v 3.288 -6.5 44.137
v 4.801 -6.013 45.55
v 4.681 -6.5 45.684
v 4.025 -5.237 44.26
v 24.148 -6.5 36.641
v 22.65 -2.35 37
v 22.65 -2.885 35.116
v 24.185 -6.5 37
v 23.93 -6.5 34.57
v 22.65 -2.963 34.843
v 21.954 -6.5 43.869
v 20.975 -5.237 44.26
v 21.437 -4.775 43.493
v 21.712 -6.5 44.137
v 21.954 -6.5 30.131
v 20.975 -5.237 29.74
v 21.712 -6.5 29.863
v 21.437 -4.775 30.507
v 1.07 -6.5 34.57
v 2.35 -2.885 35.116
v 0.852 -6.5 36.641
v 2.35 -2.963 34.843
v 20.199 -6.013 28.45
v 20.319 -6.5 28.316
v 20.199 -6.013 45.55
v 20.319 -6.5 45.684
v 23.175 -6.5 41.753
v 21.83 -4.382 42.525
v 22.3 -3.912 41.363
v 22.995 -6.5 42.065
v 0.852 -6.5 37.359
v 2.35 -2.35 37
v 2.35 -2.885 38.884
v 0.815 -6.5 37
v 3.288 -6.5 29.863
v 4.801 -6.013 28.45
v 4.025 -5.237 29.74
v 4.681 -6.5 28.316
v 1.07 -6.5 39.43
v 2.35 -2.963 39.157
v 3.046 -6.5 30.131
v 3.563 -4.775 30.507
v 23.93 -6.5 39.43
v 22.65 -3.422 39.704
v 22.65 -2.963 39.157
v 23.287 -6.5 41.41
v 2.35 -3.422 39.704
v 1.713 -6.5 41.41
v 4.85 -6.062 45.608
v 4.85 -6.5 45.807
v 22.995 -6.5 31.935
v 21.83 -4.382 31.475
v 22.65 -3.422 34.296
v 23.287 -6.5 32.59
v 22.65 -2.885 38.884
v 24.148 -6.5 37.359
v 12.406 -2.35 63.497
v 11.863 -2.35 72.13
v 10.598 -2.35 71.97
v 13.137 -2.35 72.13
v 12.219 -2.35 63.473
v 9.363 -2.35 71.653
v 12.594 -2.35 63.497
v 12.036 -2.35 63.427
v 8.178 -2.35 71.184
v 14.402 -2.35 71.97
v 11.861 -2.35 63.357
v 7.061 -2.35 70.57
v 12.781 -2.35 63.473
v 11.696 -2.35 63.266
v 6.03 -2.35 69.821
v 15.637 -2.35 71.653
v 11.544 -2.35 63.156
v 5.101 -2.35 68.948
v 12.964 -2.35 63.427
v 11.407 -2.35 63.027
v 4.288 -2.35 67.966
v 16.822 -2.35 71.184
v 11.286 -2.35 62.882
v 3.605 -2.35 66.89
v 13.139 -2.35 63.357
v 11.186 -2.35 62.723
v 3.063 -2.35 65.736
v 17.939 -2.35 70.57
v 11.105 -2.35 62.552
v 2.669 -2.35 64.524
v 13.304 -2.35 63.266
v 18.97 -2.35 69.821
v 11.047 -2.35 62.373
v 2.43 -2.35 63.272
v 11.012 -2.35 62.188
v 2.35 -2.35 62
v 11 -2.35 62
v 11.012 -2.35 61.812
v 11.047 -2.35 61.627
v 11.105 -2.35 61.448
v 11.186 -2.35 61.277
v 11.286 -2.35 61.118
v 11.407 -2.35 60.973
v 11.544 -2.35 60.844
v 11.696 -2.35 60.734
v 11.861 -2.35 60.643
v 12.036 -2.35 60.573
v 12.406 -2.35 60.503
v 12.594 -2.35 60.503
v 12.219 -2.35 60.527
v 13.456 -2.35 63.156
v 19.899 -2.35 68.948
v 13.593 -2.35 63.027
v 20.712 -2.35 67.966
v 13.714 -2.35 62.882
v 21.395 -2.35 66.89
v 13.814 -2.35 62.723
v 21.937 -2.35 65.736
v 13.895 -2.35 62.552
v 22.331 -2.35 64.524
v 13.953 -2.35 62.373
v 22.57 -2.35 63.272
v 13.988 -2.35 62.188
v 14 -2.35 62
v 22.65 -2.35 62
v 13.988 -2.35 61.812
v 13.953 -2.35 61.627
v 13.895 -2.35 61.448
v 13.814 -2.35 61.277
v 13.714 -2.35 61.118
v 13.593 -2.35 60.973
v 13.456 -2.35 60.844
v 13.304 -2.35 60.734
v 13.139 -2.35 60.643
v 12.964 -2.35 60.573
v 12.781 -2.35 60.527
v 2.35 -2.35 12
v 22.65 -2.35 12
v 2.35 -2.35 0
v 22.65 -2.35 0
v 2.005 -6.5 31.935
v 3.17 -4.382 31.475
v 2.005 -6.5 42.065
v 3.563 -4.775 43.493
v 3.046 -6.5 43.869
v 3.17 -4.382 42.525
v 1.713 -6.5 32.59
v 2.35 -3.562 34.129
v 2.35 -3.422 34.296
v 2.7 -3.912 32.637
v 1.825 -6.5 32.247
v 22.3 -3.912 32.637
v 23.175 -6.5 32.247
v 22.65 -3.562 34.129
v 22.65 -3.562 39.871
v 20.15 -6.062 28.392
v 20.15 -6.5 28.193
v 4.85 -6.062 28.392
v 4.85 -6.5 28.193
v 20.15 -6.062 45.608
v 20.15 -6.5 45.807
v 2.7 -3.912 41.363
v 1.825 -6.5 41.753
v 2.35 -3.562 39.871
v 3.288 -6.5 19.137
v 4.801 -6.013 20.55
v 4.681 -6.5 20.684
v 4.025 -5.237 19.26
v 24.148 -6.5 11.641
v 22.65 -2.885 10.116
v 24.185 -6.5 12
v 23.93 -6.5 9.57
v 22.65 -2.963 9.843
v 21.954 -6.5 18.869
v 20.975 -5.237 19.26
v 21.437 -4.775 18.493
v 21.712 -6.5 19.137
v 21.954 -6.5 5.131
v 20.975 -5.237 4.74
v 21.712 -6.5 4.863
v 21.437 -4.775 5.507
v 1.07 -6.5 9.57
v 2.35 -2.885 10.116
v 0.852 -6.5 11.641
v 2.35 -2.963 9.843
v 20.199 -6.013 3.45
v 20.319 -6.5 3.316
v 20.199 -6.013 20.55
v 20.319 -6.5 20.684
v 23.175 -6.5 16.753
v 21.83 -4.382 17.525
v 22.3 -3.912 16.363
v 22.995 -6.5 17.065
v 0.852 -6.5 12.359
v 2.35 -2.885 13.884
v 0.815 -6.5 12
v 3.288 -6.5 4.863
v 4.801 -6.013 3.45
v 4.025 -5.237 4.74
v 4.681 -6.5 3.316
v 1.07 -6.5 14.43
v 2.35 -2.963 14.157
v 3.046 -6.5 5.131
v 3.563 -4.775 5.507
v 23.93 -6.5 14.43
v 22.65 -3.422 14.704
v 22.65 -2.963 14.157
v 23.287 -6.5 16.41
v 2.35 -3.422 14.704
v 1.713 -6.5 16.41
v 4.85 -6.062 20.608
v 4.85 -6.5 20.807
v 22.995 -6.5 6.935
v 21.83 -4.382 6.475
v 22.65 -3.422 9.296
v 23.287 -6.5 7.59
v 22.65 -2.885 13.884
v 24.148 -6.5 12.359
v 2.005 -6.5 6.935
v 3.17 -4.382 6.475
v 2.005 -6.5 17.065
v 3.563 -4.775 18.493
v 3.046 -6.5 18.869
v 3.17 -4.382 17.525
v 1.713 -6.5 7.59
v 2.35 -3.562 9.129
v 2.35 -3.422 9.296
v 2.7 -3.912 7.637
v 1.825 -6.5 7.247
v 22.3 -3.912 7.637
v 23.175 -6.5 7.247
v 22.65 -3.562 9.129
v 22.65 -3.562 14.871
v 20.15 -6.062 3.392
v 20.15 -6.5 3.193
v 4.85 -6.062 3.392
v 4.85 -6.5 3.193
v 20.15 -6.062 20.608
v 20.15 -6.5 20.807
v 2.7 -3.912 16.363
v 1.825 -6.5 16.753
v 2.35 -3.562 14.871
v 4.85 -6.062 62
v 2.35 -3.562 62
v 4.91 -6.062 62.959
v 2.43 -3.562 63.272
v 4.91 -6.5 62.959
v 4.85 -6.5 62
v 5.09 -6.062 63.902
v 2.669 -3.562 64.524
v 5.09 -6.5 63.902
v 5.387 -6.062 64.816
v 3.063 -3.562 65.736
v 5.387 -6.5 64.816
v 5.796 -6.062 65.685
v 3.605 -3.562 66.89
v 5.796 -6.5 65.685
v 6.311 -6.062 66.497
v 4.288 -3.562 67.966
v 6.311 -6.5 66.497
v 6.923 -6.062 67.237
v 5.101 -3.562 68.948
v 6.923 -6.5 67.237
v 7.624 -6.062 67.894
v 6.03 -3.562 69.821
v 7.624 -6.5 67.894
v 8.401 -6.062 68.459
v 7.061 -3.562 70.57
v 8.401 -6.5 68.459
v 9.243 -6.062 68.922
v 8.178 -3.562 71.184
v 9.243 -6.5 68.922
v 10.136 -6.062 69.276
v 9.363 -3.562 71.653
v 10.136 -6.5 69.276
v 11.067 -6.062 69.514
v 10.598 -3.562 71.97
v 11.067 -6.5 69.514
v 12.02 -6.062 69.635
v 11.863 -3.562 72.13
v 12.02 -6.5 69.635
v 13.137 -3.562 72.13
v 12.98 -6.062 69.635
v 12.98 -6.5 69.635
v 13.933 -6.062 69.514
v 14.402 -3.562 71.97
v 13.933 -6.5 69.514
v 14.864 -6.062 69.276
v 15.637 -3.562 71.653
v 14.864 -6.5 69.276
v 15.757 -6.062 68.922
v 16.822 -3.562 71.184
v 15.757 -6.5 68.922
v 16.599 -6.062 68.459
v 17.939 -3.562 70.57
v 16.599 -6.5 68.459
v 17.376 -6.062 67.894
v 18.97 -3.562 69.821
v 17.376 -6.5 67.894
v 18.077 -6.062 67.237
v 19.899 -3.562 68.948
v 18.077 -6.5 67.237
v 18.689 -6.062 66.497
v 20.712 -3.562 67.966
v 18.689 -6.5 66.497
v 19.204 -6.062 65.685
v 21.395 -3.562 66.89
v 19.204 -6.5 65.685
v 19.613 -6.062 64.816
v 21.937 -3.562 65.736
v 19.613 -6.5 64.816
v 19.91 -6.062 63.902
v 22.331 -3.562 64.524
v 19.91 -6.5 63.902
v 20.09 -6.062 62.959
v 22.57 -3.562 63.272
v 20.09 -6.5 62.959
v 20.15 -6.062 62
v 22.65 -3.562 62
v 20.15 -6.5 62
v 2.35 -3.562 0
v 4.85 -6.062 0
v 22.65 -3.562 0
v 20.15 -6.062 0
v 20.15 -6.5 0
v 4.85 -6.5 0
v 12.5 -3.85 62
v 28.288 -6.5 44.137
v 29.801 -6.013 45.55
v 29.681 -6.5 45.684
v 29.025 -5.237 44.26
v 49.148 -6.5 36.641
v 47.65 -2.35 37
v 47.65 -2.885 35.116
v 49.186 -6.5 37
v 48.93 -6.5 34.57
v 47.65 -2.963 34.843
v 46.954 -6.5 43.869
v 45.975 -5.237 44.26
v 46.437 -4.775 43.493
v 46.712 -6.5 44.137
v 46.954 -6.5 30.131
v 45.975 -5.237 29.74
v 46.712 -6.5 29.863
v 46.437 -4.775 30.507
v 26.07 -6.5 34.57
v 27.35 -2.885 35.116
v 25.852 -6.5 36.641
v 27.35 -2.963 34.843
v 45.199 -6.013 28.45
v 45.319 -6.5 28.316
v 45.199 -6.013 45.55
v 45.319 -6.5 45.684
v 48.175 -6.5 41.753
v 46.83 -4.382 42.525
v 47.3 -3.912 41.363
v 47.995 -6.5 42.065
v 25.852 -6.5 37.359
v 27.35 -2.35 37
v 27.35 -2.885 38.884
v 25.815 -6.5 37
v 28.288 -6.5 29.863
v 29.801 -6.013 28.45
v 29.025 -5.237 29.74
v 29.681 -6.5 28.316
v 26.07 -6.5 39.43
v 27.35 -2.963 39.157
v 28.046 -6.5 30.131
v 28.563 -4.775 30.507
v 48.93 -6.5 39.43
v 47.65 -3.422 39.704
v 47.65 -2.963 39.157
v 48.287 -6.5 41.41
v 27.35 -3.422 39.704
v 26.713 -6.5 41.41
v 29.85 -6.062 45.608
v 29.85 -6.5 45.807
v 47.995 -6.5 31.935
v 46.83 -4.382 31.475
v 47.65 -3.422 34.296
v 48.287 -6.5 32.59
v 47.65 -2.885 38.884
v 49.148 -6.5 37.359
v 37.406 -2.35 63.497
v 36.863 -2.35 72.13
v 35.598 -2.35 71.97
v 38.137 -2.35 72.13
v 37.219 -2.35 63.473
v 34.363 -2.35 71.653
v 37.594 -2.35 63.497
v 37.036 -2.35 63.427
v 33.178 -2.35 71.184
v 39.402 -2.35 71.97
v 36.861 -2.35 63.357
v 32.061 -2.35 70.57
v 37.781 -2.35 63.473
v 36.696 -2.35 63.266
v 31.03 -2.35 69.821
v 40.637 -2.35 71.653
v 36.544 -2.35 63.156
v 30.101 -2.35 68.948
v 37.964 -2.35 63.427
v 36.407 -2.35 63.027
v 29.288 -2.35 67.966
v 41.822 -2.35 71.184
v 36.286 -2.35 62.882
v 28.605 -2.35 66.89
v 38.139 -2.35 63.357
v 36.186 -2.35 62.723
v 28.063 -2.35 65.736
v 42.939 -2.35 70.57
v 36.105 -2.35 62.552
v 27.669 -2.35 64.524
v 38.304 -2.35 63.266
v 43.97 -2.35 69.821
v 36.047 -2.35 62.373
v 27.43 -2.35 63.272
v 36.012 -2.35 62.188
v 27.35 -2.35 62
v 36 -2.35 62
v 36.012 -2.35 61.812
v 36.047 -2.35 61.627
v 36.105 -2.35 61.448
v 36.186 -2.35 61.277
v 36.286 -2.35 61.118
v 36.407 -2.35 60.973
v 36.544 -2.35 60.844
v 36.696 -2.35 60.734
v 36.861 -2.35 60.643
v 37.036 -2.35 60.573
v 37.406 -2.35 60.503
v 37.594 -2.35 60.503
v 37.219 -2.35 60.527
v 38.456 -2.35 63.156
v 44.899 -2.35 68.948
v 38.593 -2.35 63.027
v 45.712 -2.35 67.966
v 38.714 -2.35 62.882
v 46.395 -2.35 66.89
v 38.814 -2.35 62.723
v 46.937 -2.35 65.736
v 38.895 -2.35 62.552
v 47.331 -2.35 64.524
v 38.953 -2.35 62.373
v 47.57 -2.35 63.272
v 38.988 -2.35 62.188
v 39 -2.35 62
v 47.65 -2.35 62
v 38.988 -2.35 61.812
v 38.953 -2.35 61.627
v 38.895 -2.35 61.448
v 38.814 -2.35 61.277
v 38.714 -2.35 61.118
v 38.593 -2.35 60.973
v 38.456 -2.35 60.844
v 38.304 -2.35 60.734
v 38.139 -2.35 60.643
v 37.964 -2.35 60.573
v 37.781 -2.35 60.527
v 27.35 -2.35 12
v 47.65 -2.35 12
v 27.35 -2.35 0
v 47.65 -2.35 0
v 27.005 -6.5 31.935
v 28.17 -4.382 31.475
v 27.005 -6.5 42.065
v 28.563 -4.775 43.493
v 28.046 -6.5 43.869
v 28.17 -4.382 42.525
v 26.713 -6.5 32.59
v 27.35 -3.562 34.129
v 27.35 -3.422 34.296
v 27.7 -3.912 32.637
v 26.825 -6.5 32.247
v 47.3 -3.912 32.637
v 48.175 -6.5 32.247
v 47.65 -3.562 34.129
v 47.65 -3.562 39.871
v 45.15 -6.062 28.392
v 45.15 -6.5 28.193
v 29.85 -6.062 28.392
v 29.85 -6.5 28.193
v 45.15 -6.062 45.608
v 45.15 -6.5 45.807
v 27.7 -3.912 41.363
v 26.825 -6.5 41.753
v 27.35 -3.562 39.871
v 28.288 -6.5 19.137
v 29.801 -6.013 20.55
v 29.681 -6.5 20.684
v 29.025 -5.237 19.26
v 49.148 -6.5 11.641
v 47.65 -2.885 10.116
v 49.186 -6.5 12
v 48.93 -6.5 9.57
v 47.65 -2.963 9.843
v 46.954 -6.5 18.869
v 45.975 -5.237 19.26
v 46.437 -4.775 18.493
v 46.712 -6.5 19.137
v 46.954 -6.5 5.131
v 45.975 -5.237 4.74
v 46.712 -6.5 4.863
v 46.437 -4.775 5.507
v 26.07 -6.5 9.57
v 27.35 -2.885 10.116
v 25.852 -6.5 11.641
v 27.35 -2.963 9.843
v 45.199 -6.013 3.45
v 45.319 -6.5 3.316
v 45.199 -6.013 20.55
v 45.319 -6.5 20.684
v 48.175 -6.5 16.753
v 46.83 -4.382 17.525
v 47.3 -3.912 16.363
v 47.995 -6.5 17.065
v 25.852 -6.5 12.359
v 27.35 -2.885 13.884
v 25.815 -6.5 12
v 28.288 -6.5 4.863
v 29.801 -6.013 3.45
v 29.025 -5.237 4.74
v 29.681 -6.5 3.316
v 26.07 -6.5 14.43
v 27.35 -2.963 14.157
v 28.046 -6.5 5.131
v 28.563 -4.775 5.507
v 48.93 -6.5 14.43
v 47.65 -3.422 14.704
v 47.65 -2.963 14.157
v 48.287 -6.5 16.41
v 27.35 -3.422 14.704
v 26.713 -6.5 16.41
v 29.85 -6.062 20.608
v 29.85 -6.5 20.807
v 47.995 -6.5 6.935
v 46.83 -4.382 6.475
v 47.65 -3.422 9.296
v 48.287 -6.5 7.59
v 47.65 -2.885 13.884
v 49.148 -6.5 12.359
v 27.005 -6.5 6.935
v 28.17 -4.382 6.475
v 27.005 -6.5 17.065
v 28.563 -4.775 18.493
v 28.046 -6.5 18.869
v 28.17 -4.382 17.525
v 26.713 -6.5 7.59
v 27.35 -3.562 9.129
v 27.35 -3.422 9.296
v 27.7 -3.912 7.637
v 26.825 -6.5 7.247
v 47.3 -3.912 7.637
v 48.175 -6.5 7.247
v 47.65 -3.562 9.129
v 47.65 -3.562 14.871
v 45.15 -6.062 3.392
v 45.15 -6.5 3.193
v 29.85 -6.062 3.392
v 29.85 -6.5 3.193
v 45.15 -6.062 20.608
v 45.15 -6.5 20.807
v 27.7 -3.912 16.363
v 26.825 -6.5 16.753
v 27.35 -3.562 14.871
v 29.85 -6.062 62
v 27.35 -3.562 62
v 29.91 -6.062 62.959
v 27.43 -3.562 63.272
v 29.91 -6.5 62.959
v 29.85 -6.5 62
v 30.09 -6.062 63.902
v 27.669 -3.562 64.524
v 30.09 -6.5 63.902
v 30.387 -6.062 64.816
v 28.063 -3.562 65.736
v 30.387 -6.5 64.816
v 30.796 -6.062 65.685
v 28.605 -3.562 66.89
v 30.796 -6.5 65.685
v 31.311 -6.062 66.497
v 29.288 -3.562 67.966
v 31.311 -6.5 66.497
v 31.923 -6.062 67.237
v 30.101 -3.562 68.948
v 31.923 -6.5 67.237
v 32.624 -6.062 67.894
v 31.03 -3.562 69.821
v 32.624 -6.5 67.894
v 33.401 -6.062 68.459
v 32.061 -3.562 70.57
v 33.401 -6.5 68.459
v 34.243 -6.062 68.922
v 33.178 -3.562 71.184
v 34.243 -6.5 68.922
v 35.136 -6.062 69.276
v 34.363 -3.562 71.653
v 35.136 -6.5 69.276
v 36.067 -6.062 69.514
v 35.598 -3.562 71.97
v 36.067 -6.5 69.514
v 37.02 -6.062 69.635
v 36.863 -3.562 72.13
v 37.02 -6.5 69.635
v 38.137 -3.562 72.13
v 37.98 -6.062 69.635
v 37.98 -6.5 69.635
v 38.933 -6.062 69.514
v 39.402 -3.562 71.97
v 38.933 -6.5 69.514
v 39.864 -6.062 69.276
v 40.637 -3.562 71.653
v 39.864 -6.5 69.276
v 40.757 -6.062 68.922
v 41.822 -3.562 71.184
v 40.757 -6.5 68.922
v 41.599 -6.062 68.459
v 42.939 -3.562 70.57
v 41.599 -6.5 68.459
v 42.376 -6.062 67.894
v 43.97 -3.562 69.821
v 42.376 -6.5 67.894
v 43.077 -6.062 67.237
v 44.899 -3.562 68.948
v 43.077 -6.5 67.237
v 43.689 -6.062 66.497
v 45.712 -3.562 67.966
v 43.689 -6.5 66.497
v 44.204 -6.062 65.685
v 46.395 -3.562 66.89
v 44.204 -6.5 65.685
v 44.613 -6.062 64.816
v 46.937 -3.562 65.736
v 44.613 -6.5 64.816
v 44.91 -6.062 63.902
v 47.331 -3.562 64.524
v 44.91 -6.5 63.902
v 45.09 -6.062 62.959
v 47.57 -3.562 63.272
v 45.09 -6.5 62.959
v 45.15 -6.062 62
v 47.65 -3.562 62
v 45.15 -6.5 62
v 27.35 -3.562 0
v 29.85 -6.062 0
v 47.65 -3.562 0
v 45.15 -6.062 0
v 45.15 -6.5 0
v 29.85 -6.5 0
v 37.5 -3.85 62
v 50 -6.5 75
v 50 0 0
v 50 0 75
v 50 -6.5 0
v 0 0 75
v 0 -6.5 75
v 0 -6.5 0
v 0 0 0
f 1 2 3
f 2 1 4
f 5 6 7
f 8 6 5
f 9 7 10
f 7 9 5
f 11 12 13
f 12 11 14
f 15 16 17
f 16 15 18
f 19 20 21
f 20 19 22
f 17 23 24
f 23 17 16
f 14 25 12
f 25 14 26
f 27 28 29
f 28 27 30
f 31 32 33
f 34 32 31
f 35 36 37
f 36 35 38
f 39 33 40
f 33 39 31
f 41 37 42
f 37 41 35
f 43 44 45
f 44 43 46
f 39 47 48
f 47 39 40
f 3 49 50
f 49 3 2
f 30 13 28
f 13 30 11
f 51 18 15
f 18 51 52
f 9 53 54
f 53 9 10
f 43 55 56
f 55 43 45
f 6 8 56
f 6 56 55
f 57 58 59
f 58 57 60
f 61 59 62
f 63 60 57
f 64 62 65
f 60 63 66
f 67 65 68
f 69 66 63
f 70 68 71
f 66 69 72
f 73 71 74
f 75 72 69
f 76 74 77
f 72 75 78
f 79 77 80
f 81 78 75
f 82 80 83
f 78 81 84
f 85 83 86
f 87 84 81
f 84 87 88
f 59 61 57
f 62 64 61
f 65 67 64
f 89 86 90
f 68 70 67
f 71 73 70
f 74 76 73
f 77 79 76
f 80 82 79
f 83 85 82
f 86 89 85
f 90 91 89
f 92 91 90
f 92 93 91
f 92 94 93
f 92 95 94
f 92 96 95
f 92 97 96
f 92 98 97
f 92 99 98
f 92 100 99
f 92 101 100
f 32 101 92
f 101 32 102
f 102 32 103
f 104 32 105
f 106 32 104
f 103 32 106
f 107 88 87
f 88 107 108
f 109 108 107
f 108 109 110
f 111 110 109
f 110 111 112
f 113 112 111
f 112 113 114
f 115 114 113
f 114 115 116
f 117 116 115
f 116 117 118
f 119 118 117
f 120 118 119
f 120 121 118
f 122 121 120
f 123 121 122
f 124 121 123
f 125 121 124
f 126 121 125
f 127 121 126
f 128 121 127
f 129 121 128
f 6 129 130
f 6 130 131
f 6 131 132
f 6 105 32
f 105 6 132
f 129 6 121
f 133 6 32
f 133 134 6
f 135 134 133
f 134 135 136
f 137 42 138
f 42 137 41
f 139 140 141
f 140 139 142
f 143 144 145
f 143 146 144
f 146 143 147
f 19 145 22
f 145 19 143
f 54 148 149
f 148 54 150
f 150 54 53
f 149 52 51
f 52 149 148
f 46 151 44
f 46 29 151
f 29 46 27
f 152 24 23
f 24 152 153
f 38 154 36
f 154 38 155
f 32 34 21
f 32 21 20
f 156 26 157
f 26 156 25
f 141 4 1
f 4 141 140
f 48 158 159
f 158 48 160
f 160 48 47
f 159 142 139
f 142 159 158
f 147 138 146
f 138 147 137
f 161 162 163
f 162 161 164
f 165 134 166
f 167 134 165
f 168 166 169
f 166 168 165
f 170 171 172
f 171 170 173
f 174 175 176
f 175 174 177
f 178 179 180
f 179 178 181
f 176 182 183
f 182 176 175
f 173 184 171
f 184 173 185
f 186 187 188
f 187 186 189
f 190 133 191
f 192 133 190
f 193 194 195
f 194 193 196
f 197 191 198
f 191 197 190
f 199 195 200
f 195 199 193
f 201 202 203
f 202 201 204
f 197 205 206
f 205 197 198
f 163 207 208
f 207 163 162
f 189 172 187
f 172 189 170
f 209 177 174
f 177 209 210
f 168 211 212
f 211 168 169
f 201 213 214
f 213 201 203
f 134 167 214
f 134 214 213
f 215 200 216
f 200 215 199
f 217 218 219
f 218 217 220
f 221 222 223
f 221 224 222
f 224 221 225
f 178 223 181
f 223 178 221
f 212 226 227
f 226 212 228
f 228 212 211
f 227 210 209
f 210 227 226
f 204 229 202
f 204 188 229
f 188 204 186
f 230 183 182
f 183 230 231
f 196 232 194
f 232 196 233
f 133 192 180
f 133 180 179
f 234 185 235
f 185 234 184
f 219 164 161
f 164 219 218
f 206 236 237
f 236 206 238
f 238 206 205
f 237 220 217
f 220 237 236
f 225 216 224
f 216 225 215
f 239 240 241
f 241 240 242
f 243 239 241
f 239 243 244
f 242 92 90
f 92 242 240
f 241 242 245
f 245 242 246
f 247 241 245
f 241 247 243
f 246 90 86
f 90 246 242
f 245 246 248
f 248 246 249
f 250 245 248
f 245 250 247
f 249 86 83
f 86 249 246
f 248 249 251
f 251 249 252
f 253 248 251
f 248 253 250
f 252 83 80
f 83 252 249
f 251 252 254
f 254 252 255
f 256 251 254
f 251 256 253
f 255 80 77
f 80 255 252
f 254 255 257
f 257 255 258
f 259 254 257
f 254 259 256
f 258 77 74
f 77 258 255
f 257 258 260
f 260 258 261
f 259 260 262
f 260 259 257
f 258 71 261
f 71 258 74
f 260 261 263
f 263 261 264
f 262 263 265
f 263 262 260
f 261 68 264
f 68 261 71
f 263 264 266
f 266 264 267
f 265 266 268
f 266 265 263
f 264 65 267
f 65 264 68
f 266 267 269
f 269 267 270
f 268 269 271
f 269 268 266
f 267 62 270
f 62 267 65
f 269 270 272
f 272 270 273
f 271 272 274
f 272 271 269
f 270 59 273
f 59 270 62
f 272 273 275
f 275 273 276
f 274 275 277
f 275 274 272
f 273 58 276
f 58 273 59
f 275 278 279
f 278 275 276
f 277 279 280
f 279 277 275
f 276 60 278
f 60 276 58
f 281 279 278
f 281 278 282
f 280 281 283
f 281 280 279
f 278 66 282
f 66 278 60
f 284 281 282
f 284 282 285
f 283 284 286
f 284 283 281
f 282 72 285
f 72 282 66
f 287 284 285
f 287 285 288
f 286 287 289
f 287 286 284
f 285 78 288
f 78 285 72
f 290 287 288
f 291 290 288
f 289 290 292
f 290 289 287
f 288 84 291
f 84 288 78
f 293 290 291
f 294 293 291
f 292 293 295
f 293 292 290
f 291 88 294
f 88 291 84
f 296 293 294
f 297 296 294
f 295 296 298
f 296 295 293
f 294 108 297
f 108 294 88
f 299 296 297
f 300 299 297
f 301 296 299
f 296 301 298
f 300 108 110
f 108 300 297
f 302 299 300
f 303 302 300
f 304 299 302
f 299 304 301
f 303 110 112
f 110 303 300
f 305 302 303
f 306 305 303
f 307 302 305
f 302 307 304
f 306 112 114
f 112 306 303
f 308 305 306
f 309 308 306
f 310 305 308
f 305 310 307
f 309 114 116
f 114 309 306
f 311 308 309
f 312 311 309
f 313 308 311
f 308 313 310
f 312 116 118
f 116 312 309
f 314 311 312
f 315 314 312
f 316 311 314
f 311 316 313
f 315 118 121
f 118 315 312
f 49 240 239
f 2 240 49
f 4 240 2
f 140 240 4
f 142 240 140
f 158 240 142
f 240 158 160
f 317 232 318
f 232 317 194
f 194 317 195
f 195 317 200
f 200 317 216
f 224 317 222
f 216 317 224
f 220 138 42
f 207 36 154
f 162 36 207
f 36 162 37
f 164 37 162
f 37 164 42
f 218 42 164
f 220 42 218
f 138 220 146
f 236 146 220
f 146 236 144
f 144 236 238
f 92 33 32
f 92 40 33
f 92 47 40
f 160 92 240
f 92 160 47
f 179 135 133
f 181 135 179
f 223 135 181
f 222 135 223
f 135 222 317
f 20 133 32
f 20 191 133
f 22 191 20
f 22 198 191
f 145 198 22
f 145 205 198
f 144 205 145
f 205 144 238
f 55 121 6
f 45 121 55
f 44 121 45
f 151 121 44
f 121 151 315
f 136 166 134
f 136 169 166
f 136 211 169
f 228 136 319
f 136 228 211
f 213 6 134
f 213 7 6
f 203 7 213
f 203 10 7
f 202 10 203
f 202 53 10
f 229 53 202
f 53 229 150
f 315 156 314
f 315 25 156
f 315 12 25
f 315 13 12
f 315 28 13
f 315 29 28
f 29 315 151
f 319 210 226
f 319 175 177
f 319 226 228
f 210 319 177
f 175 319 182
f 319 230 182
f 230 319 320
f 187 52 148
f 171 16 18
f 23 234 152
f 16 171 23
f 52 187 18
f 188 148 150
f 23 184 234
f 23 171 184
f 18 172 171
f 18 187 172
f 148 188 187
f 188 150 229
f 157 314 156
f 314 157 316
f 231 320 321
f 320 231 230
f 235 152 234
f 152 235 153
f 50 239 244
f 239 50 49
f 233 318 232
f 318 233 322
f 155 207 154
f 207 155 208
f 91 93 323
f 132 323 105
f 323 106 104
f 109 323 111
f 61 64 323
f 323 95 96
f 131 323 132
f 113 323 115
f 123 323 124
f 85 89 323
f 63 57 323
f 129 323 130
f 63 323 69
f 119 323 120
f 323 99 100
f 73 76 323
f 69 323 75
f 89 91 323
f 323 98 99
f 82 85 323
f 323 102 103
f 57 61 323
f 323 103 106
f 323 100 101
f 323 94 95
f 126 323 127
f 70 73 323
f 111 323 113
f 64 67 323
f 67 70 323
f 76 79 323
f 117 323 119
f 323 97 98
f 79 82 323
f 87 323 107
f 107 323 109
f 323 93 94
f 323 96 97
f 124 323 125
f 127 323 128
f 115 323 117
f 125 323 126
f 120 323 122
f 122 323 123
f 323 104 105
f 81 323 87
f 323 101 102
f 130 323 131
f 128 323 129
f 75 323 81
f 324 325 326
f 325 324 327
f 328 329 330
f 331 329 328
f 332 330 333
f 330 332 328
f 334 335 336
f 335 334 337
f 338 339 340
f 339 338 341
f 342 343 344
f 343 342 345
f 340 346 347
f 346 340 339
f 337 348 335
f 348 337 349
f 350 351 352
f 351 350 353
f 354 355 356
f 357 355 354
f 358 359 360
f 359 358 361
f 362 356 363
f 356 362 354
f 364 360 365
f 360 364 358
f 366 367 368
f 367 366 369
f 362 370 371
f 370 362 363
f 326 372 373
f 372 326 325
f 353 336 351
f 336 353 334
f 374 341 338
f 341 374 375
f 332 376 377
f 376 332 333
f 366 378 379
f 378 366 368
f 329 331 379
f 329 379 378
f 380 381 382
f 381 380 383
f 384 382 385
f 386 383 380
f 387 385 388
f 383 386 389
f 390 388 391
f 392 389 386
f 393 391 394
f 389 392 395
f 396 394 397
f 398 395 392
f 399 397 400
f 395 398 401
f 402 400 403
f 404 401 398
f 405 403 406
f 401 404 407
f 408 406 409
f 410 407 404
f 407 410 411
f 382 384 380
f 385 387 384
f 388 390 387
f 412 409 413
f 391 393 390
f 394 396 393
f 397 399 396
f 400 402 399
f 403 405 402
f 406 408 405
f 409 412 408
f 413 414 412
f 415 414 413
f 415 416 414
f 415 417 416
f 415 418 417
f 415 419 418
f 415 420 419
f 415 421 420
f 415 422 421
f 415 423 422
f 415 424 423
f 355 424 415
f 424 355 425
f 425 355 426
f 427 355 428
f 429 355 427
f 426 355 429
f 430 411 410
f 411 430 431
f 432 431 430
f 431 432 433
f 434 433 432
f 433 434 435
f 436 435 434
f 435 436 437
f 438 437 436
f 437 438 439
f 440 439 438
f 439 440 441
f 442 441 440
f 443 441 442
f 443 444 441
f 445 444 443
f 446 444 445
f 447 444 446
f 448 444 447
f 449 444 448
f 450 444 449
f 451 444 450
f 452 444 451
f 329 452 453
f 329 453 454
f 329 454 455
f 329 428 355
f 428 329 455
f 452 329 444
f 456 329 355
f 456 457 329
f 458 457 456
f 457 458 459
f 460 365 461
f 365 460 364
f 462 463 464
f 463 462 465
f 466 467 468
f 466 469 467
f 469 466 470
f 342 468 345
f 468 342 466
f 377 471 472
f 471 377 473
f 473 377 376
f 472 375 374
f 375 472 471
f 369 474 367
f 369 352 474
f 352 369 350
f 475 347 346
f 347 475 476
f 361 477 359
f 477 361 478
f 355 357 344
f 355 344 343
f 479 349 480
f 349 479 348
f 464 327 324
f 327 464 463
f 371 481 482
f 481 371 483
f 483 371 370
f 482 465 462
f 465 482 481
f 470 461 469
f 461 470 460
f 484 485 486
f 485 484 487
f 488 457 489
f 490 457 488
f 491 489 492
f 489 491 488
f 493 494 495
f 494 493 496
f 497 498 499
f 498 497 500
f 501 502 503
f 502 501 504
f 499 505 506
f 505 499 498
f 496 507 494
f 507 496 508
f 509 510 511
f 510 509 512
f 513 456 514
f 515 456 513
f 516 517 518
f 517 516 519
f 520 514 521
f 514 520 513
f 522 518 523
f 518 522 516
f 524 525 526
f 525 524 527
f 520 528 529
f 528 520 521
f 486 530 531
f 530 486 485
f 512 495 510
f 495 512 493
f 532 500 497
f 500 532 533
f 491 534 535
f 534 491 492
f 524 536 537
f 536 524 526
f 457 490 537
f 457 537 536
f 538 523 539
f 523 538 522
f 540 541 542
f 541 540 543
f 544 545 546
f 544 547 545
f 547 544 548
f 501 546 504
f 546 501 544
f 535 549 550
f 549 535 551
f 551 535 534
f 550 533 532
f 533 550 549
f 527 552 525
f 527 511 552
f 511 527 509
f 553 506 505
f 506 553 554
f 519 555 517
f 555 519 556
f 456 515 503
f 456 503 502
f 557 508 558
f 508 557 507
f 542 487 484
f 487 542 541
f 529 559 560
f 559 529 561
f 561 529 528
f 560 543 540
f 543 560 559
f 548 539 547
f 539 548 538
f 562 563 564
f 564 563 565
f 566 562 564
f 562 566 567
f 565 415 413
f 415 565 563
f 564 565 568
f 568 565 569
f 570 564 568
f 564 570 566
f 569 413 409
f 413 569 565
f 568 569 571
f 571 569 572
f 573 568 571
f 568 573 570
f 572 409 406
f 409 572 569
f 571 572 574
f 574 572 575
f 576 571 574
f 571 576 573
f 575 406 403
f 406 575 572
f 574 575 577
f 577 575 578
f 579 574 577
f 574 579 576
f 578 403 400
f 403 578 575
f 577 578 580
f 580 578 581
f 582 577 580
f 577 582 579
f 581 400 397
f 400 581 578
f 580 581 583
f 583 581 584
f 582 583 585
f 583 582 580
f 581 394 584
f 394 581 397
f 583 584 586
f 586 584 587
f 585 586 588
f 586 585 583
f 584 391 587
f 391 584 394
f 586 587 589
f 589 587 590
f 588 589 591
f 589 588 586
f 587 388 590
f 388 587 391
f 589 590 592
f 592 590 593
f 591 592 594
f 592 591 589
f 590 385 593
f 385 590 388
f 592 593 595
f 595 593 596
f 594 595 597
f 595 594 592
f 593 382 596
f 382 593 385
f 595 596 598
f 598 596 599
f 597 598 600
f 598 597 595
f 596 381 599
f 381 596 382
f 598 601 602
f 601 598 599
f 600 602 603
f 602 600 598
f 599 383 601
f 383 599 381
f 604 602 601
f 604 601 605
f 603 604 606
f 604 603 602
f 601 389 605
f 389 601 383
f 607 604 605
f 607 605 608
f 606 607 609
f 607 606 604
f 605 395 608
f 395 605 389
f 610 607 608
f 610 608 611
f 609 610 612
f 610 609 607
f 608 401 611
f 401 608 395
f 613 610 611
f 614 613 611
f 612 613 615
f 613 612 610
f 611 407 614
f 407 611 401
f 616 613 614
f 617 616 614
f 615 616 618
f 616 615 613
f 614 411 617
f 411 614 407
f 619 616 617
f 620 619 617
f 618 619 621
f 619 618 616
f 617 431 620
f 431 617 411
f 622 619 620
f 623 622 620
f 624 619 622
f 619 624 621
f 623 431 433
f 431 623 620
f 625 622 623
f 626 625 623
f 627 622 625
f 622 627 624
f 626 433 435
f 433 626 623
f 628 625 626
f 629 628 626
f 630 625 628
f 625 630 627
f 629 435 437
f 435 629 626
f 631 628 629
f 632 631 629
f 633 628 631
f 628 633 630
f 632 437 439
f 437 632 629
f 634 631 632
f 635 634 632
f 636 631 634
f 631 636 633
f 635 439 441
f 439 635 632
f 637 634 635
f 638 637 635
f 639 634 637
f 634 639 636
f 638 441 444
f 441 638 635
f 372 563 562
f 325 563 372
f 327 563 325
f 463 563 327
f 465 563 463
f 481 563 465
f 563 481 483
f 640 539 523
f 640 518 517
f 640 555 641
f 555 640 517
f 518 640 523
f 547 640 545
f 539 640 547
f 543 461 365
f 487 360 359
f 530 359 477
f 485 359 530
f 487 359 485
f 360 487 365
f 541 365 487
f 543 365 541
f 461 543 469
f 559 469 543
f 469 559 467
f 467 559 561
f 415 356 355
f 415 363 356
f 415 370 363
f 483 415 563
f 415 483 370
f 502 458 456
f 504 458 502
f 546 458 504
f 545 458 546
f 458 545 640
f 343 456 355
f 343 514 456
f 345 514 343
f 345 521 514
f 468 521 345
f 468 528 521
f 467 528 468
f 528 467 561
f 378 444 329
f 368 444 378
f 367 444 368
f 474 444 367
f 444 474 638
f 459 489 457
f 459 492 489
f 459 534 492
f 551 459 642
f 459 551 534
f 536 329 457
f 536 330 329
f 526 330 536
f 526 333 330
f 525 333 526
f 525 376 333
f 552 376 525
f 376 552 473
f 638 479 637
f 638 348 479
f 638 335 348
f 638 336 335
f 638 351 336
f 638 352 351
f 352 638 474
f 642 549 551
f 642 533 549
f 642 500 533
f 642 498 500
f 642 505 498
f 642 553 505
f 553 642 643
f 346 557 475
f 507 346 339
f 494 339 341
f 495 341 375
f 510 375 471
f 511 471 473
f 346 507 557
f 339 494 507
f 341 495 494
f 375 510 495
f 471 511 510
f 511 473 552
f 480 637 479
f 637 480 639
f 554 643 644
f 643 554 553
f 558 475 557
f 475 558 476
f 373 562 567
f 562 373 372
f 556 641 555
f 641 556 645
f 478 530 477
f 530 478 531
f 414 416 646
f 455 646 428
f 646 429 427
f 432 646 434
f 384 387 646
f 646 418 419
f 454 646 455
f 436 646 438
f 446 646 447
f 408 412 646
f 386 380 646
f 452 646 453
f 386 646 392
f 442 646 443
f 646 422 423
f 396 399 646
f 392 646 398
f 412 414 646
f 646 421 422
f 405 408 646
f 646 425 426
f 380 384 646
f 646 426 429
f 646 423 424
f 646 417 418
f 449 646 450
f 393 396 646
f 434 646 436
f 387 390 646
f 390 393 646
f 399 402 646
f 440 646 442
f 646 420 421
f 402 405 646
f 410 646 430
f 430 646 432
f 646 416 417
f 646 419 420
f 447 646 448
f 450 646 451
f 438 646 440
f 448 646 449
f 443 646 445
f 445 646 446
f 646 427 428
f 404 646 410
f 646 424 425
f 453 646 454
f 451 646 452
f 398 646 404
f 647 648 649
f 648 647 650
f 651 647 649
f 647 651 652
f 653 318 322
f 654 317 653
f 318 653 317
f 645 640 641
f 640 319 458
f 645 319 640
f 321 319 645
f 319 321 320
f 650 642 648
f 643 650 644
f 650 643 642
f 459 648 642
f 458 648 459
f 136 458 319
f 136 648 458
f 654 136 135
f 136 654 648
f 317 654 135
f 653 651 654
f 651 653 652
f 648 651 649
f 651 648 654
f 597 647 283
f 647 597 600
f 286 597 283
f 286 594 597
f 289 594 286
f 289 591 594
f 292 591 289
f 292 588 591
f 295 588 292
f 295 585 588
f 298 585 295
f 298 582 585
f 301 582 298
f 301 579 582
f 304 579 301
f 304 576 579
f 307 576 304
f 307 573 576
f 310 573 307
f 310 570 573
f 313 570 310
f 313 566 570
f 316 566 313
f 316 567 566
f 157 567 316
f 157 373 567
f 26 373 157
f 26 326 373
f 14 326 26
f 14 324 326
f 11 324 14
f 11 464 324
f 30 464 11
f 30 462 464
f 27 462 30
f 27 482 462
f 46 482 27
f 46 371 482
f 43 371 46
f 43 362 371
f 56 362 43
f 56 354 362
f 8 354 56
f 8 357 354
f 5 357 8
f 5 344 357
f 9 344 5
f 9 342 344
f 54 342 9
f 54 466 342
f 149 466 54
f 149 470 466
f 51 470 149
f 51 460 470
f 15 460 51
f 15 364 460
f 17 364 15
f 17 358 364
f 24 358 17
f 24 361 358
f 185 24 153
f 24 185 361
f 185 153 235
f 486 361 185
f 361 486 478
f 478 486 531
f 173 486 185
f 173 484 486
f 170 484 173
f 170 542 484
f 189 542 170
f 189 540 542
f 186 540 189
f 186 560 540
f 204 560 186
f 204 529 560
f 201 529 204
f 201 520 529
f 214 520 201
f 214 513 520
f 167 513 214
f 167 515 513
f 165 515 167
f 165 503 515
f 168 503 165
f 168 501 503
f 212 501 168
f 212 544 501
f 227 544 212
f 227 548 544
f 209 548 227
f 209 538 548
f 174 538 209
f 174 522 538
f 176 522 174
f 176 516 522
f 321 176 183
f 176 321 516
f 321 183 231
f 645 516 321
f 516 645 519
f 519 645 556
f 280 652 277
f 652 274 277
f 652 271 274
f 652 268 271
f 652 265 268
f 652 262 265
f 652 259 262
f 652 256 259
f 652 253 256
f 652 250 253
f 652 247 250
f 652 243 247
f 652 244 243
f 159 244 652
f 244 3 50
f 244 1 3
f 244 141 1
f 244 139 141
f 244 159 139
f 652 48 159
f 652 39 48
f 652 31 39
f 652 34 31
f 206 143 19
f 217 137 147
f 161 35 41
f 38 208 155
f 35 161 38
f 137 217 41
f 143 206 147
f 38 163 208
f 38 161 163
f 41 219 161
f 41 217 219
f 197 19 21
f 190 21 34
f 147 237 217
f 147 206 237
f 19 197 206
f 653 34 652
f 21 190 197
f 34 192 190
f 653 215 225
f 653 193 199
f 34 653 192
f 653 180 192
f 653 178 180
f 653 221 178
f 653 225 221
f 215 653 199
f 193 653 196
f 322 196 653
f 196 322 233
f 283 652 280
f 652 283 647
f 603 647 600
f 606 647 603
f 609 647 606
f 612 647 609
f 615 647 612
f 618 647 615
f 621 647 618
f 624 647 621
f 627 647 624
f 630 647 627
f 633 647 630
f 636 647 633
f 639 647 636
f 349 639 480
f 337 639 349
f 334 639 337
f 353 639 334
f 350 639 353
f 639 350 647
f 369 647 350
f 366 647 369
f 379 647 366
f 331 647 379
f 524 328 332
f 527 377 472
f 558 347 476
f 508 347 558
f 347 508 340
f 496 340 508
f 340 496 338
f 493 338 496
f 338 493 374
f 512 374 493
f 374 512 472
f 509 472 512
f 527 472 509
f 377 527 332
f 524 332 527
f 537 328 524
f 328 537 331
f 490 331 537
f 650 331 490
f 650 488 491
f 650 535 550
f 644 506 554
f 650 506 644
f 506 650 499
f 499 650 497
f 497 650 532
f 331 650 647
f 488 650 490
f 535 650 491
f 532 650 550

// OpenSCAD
/*This file is the master copy of the multiconnect slot back. 
All components of this file are required in any file using this backer
*/

totalWidth = 50;
totalHeight = 75;

/*[Slot Customization]*/
//Distance between Multiconnect slots on the back (25mm is standard for MultiBoard)
distanceBetweenSlots = 25;
//QuickRelease removes the small indent in the top of the slots that lock the part into place
slotQuickRelease = false;
//Dimple scale tweaks the size of the dimple in the slot for printers that need a larger dimple to print correctly
dimpleScale = 1; //[0.5:.05:1.5]
//Scale the size of slots in the back (1.015 scale is default for a tight fit. Increase if your finding poor fit. )
slotTolerance = 1.00; //[0.925:0.005:1.075]
//Move the slot in (positive) or out (negative)
slotDepthMicroadjustment = 0; //[-.5:0.05:.5]
//enable a slot on-ramp for easy mounting of tall items
onRampEnabled = true;
//frequency of slots for on-ramp. 1 = every slot; 2 = every 2 slots; etc.
onRampEveryXSlots = 1;

/* [Hidden] */

multiconnectBack(backWidth = totalWidth, backHeight = totalHeight, distanceBetweenSlots = distanceBetweenSlots);

//BEGIN MODULES
//Slotted back Module
module multiconnectBack(backWidth, backHeight, distanceBetweenSlots)
{
    //slot count calculates how many slots can fit on the back. Based on internal width for buffer. 
    //slot width needs to be at least the distance between slot for at least 1 slot to generate
    let (backWidth = max(backWidth,distanceBetweenSlots), backHeight = max(backHeight, 25),slotCount = floor(backWidth/distanceBetweenSlots), backThickness = 6.5){
        difference() {
            translate(v = [0,-backThickness,0]) cube(size = [backWidth,backThickness,backHeight]);
            //Loop through slots and center on the item
            //Note: I kept doing math until it looked right. It's possible this can be simplified.
            for (slotNum = [0:1:slotCount-1]) {
                translate(v = [distanceBetweenSlots/2+(backWidth/distanceBetweenSlots-slotCount)*distanceBetweenSlots/2+slotNum*distanceBetweenSlots,-2.35+slotDepthMicroadjustment,backHeight-13]) {
                    color(c = "red")  slotTool(backHeight);
                }
            }
        }
    }
    //Create Slot Tool
    module slotTool(totalHeight) {
        scale(v = slotTolerance)
        //slot minus optional dimple with optional on-ramp
        let (slotProfile = [[0,0],[10.15,0],[10.15,1.2121],[7.65,3.712],[7.65,5],[0,5]])
        difference() {
            union() {
                //round top
                rotate(a = [90,0,0,]) 
                    rotate_extrude($fn=50) 
                        polygon(points = slotProfile);
                //long slot
                translate(v = [0,0,0]) 
                    rotate(a = [180,0,0]) 
                    linear_extrude(height = totalHeight+1) 
                        union(){
                            polygon(points = slotProfile);
                            mirror([1,0,0])
                                polygon(points = slotProfile);
                        }
                //on-ramp
                if(onRampEnabled)
                    for(y = [1:onRampEveryXSlots:totalHeight/distanceBetweenSlots])
                        translate(v = [0,-5,-y*distanceBetweenSlots]) 
                            rotate(a = [-90,0,0]) 
                                color(c = "orange") cylinder(h = 5, r1 = 12, r2 = 10.15);
            }
            //dimple
            if (slotQuickRelease == false)
                scale(v = dimpleScale) 
                rotate(a = [90,0,0,]) 
                    rotate_extrude($fn=50) 
                        polygon(points = [[0,0],[0,1.5],[1.5,0]]);
        }
    }
}
